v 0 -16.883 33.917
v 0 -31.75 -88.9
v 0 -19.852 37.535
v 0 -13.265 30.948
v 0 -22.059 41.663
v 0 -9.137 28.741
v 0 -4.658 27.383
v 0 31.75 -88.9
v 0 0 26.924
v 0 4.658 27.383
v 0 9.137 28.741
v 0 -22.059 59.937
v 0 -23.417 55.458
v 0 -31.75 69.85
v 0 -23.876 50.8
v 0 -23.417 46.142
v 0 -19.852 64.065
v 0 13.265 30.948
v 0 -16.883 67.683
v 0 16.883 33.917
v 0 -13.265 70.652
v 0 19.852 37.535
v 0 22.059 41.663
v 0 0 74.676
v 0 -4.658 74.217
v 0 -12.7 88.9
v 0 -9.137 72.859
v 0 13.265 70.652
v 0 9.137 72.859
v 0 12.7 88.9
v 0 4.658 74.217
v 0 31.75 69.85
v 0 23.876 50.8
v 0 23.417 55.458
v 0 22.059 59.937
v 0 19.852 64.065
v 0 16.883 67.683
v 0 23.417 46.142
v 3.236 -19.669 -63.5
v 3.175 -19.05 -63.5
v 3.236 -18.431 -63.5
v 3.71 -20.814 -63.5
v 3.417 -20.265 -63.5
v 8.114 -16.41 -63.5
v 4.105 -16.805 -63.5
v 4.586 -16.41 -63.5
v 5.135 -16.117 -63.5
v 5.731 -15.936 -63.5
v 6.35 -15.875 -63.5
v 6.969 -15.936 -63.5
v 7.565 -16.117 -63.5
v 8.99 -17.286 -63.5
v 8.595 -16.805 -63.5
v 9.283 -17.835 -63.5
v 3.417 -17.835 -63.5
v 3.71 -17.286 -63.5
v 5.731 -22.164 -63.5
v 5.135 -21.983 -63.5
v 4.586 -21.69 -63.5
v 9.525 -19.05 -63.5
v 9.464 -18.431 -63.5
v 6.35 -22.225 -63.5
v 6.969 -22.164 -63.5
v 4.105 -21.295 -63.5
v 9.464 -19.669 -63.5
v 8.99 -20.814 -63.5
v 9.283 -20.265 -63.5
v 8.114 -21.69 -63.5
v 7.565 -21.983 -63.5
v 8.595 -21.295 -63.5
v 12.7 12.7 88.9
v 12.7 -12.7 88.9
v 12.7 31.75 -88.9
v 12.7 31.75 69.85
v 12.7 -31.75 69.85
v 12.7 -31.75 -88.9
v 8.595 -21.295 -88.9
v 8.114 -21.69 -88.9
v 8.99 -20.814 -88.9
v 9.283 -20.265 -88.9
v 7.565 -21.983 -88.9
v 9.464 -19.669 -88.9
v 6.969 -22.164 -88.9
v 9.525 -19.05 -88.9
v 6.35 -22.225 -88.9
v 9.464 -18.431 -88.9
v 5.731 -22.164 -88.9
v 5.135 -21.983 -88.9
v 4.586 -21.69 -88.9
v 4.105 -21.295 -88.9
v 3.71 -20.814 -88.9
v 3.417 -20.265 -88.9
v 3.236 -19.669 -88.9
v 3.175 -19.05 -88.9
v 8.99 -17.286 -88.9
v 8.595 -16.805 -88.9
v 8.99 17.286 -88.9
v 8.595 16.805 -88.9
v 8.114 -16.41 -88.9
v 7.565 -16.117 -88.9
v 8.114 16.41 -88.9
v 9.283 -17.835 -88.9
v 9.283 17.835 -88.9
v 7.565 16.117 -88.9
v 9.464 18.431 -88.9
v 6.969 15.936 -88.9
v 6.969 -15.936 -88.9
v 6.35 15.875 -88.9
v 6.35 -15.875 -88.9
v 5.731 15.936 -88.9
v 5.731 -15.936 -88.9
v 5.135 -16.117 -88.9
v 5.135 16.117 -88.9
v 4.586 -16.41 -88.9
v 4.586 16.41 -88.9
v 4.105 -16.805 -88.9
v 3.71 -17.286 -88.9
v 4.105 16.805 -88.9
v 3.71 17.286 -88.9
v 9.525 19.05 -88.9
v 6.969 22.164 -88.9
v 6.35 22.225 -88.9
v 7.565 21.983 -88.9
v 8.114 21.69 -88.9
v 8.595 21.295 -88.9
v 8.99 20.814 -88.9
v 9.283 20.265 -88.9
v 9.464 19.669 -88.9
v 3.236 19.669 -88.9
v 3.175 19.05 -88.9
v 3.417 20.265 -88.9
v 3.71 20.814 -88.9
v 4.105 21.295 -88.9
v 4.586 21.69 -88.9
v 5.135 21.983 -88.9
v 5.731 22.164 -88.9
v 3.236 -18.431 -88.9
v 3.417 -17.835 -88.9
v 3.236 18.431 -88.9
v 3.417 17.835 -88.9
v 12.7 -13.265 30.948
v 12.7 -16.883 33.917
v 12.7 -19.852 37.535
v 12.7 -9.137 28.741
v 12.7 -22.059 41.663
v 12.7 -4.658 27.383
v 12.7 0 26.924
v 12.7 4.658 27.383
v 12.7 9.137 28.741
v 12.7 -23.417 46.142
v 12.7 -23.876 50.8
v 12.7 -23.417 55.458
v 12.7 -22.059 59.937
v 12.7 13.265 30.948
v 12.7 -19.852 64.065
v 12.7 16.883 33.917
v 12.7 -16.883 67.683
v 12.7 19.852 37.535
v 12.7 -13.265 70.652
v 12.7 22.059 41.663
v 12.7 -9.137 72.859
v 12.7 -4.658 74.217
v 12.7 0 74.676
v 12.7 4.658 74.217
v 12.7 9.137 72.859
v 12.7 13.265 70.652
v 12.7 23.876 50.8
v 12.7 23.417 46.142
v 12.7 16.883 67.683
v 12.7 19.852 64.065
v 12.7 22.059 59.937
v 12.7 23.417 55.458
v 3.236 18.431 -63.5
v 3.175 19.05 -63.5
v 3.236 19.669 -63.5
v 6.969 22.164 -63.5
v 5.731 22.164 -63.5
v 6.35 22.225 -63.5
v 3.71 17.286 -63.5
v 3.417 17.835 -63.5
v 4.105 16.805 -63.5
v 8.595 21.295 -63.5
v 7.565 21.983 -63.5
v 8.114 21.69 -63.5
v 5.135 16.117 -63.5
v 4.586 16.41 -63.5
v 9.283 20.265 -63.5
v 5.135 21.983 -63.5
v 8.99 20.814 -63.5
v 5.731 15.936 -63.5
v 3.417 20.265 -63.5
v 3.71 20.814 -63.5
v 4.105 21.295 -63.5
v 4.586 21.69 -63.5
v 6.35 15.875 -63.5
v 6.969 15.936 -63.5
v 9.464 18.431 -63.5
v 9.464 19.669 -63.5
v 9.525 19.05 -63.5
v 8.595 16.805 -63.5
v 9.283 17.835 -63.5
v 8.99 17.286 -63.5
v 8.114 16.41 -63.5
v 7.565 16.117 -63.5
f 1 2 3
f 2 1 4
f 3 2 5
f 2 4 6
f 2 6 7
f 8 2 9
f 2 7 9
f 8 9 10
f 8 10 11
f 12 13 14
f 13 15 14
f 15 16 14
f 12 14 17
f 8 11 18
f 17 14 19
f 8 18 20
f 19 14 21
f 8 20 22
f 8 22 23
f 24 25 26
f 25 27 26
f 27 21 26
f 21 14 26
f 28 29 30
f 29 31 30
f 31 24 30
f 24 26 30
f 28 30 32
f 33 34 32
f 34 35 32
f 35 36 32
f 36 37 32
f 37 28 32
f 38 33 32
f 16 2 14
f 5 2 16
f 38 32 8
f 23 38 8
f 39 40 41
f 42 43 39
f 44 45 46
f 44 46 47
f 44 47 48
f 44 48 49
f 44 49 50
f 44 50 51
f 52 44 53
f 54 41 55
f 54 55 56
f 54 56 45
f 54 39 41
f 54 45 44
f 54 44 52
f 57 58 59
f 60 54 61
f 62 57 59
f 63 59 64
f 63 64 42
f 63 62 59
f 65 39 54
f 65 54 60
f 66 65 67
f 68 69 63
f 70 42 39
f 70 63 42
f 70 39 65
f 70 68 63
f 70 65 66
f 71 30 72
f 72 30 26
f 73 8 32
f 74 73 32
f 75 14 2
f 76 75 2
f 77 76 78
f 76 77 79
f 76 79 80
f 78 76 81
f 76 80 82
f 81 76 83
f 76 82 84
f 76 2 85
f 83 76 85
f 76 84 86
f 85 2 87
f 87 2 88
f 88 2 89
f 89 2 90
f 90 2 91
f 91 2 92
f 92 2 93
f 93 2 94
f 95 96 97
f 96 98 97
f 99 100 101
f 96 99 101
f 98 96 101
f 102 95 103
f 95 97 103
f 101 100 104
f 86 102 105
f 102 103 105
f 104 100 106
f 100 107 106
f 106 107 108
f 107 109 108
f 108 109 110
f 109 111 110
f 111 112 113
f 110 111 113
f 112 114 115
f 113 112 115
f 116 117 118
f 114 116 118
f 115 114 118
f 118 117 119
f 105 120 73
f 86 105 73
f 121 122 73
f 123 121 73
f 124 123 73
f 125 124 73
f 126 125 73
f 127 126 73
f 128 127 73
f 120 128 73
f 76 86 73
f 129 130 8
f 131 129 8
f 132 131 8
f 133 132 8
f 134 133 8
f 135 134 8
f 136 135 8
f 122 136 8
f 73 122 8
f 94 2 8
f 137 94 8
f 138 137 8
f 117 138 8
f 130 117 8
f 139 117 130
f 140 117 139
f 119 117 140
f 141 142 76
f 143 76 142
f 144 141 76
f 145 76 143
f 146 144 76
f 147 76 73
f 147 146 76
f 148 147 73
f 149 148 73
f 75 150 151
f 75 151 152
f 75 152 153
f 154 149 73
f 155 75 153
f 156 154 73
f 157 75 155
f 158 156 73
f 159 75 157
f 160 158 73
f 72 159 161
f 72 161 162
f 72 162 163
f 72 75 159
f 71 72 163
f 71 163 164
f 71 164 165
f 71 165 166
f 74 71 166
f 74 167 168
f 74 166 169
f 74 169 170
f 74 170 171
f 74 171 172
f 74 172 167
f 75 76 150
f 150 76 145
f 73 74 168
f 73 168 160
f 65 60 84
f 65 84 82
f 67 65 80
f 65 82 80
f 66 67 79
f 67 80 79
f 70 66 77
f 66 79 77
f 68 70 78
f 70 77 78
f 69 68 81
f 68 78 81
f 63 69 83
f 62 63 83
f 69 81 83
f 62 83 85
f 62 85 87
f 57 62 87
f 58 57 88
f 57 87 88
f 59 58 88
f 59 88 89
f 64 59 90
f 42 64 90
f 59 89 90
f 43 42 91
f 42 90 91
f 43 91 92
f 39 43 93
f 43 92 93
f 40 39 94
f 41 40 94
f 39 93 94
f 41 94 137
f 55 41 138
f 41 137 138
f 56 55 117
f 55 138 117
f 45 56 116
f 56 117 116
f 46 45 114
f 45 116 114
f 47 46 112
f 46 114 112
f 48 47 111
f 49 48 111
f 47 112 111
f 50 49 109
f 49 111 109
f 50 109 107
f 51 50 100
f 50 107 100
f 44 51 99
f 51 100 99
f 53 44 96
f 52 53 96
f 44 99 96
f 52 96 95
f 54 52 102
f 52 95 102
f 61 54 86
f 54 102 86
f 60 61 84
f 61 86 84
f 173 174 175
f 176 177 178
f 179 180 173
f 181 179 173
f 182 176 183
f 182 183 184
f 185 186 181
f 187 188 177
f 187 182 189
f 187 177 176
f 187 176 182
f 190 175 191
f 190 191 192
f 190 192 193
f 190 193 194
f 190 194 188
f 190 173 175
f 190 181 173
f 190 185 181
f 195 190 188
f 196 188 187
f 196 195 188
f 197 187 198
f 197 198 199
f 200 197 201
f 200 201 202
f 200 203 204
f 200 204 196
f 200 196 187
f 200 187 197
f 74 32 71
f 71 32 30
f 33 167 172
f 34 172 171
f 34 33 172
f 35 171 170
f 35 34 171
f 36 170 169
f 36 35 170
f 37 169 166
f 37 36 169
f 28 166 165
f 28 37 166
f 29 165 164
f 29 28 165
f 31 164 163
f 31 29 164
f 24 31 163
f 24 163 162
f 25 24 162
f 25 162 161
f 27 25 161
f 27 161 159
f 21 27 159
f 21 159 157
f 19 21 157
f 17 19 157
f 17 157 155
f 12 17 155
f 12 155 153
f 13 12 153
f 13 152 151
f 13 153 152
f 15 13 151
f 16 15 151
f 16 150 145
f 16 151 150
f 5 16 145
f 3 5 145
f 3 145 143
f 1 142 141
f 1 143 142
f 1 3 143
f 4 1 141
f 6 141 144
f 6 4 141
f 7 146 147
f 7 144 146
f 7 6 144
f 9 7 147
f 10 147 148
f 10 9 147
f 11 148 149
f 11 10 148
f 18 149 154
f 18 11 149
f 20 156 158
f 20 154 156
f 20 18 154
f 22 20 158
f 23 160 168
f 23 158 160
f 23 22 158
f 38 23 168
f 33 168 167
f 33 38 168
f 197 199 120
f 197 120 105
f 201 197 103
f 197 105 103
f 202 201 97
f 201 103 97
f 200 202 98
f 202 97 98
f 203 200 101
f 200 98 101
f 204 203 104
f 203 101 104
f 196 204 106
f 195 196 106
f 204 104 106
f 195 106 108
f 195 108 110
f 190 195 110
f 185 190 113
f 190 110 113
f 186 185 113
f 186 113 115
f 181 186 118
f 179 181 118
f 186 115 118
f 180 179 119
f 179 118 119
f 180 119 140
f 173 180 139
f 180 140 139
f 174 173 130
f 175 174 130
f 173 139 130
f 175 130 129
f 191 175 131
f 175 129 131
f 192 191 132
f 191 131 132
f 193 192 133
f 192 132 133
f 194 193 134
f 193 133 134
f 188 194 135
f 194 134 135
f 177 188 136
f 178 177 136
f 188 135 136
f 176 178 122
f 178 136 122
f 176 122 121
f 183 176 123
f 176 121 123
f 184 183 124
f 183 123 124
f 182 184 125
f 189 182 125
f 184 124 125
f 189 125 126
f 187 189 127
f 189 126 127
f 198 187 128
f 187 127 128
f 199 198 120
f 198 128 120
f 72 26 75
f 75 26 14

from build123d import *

# Parameters (mm, degrees)
F1_DEPTH = 12.7
F2_R     = 23.876
F3_DEPTH = 12.701
F4_R     = 3.175
F5_DEPTH = 25.4


with BuildPart() as f1:
    # F0 (on Right) → F1 (new body)
    with BuildSketch(Plane.YZ):
        Polygon((12.7, 88.9), (0, 88.9), (-12.7, 88.9), (-31.75, 69.85), (-31.75, -88.9), (0, -88.9), (31.75, -88.9), (31.75, 69.85), align=None)
    extrude(amount=F1_DEPTH)

    # F2 (on Right) → F3 (cut, through all)
    with BuildSketch(Plane.YZ):
        with Locations((0, 50.8)):
            Circle(F2_R)
    extrude(amount=F3_DEPTH, mode=Mode.SUBTRACT)

    # F4 (on face) → F5 (cut)
    with BuildSketch(Plane(origin=(0, 0, -88.9), x_dir=(1, 0, 0), z_dir=(0, 0, -1))):
        with Locations((6.35, 19.05)):
            Circle(F4_R)
        with Locations((6.35, -19.05)):
            Circle(F4_R)
    extrude(amount=-F5_DEPTH, mode=Mode.SUBTRACT)


solid = f1.part
